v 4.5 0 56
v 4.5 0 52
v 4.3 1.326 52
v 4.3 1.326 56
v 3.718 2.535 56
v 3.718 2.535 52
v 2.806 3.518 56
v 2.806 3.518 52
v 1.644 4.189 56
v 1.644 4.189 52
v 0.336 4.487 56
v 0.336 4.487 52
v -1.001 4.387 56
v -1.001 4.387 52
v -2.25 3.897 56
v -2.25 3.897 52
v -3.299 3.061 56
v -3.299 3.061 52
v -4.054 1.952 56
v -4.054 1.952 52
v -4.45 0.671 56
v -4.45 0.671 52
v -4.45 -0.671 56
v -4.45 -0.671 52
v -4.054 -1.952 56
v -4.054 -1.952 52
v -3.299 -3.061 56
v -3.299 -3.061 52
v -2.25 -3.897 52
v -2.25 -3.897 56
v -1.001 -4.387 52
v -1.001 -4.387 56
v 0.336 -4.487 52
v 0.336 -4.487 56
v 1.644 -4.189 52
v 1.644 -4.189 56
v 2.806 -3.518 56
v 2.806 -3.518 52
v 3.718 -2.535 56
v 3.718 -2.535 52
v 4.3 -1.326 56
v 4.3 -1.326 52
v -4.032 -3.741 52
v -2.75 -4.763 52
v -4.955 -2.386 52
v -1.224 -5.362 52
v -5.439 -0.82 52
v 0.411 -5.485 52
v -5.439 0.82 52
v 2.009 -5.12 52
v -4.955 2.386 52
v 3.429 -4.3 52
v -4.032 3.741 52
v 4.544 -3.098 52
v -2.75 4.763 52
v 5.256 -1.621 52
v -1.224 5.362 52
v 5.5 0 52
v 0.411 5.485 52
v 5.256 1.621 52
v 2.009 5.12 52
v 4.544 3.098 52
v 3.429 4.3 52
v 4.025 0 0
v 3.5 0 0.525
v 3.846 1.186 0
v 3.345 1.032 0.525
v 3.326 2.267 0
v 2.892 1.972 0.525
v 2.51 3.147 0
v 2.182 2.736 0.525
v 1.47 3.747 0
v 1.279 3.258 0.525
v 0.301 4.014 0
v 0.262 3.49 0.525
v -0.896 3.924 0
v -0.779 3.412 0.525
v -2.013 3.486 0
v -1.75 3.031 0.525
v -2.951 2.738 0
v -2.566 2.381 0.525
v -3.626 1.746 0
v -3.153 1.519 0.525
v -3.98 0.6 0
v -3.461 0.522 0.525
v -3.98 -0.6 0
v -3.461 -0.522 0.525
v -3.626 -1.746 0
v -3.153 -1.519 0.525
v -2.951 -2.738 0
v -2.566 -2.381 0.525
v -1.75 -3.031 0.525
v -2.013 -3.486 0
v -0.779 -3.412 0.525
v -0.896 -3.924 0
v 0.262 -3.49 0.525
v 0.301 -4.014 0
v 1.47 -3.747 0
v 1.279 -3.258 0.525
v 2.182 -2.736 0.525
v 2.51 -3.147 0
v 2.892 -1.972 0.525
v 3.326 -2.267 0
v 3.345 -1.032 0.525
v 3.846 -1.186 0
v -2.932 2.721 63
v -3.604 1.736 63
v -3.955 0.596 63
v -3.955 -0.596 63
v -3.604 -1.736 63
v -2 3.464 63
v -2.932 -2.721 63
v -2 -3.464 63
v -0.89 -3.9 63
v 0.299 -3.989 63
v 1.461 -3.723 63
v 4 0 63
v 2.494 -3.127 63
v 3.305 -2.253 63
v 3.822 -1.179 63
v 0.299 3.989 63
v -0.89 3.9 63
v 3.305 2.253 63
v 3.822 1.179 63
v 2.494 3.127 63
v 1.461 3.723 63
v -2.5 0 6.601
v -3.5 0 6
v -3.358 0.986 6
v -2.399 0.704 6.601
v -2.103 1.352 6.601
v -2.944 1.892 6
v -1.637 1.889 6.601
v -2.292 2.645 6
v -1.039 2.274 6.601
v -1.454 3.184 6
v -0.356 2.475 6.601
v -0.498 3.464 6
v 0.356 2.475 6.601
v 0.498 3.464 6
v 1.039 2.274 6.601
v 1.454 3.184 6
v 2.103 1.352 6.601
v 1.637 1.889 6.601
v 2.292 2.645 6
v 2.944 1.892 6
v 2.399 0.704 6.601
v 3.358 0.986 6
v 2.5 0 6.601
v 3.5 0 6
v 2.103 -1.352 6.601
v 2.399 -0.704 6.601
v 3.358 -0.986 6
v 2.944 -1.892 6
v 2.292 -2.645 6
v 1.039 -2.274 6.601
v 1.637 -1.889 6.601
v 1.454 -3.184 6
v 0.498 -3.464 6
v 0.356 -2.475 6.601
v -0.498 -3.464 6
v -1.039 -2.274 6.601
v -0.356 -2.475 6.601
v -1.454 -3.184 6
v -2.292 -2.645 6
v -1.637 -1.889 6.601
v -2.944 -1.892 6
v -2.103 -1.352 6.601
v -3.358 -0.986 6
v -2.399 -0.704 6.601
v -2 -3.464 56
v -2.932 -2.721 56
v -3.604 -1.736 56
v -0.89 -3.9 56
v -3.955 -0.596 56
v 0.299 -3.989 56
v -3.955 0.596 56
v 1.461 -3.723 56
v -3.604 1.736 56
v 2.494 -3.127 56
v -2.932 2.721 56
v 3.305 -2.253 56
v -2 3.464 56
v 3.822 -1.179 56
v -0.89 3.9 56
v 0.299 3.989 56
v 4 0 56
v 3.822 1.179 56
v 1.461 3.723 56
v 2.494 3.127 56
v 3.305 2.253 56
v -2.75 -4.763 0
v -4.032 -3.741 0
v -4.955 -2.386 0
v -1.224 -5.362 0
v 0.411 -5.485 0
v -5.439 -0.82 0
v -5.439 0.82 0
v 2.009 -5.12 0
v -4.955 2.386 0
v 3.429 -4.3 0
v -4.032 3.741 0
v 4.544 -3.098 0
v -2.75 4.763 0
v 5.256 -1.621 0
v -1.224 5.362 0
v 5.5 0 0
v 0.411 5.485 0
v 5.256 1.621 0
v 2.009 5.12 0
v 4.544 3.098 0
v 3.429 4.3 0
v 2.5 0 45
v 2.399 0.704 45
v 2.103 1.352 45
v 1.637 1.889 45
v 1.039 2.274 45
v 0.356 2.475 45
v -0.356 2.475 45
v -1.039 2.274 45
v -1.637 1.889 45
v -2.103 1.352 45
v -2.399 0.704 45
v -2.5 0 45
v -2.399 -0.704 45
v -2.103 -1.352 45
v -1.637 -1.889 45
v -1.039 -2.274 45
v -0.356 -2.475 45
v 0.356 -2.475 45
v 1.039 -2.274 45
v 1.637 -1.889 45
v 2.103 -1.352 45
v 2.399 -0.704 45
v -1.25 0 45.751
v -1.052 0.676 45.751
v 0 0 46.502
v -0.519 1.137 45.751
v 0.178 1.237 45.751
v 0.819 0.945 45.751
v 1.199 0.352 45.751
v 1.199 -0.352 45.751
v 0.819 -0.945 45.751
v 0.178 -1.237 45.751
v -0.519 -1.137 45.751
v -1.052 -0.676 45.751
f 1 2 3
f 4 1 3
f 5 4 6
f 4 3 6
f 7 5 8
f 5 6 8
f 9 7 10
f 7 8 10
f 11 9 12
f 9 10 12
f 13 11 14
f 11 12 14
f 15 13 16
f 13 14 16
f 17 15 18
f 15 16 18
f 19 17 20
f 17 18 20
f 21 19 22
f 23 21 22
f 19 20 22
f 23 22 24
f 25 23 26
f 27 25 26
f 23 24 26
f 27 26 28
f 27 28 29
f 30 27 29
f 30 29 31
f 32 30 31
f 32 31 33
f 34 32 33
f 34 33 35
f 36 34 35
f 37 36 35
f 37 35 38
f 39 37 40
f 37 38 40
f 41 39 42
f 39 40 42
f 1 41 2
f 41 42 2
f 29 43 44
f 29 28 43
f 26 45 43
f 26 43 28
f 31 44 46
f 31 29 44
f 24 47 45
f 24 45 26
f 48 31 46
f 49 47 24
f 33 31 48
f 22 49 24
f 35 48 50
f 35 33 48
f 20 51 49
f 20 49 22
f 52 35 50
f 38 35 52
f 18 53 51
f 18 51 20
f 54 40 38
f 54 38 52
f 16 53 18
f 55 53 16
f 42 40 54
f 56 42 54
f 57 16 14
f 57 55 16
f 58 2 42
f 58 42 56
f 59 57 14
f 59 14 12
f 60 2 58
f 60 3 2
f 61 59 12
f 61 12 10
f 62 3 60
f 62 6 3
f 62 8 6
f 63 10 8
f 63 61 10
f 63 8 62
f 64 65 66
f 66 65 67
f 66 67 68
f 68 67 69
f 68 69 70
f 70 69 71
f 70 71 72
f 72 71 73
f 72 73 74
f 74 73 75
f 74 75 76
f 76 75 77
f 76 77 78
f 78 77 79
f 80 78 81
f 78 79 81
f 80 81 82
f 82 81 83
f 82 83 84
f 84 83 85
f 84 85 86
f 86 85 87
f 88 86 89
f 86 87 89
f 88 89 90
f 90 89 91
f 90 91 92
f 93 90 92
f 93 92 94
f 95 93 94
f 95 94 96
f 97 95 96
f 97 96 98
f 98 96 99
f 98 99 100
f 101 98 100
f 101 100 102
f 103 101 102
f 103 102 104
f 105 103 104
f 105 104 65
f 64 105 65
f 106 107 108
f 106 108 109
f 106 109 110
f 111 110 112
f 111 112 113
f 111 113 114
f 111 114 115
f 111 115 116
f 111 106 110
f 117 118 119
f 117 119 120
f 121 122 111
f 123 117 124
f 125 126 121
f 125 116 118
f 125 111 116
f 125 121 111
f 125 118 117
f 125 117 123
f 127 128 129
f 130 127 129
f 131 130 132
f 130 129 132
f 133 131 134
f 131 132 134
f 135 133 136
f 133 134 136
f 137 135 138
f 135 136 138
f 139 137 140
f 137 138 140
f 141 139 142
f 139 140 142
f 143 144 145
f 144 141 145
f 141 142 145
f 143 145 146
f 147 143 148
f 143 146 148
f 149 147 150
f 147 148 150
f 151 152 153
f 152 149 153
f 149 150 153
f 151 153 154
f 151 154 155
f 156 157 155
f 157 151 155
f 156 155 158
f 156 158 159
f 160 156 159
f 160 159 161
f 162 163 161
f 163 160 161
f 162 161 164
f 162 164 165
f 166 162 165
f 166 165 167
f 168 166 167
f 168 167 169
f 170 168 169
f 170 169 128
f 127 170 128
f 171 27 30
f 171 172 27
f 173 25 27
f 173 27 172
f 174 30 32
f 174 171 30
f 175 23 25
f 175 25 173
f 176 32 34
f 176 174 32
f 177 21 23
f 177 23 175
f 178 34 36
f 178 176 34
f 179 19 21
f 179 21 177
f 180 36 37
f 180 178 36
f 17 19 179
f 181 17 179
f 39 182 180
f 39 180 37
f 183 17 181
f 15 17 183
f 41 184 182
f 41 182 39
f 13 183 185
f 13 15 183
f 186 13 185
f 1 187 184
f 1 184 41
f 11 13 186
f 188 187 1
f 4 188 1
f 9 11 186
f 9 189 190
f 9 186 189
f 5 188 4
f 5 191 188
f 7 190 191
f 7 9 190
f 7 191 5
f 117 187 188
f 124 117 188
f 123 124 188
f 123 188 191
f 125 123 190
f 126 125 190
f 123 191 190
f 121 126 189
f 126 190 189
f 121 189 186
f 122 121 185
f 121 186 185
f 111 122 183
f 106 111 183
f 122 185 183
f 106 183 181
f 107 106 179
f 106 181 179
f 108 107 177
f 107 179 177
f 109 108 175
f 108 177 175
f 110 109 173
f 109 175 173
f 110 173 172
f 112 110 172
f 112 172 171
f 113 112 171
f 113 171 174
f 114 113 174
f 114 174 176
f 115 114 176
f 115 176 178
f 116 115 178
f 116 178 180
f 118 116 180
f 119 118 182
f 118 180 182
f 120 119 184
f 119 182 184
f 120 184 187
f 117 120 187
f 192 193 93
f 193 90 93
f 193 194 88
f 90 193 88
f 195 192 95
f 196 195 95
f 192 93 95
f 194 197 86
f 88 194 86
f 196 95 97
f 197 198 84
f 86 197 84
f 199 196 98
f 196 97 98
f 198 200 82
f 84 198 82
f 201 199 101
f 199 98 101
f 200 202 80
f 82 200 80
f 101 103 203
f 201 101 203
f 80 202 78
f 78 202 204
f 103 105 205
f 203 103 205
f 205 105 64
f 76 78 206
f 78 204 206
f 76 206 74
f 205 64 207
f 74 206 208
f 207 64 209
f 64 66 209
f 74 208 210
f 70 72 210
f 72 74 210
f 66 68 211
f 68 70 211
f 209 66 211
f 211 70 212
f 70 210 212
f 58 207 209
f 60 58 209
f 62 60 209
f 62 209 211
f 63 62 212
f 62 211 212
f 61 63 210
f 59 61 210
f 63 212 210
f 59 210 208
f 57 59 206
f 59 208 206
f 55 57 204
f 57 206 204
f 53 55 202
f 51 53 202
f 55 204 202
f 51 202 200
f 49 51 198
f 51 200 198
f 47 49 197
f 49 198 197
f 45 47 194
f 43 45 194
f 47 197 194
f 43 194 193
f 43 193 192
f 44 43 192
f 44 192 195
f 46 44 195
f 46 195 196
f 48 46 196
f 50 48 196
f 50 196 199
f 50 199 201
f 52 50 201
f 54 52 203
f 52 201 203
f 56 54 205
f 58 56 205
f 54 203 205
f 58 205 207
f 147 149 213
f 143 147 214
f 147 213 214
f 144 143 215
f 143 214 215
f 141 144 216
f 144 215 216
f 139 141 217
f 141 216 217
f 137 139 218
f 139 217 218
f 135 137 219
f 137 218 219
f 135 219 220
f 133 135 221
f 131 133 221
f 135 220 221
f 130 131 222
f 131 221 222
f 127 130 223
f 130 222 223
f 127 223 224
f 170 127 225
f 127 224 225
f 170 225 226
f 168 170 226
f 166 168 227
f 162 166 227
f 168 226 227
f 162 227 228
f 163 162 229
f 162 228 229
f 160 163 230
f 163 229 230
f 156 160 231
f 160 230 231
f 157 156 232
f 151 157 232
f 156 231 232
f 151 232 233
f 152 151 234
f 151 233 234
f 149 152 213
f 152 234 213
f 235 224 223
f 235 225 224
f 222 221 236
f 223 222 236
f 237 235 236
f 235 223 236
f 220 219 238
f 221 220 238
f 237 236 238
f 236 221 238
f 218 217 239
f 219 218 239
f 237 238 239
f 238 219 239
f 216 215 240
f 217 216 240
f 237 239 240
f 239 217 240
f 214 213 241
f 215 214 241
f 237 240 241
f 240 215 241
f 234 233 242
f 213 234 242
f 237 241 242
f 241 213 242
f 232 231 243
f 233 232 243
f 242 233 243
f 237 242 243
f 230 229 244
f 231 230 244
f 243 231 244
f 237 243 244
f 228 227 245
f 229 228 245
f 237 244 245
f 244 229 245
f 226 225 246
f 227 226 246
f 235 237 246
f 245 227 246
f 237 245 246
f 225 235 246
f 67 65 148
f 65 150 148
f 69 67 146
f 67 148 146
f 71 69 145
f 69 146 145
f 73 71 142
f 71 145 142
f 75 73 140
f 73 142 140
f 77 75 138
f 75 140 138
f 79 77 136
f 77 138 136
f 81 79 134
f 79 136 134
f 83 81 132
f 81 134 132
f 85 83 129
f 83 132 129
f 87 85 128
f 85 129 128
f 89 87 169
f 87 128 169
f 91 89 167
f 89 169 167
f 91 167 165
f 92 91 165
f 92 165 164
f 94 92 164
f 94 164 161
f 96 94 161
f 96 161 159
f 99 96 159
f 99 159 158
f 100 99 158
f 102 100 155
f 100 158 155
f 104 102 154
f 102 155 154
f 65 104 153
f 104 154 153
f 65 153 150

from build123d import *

# Parameters (mm, degrees)
SKETCH1_R                       = 5.5
BOSS_EXTRUDE1_DEPTH             = 52
SKETCH2_R                       = 4.5
BOSS_EXTRUDE2_DEPTH             = 4
SKETCH3_R                       = 4
BOSS_EXTRUDE3_DEPTH             = 7
F_5_0_5_DIAMETER_HOLE1_D        = 5
F_5_0_5_DIAMETER_HOLE1_DEPTH    = 45
F_5_0_5_DIAMETER_HOLE1_TIP      = 1.502151548
M8X1_0_TAPPED_HOLE1_D           = 7
M8X1_0_TAPPED_HOLE1_DEPTH       = 6
M8X1_0_TAPPED_HOLE1_CSINK_D     = 8.05
M8X1_0_TAPPED_HOLE1_CSINK_ANGLE = 90
M8X1_0_TAPPED_HOLE1_TIP         = 2.103012167


with BuildPart() as part:
    # Sketch1 → Boss-Extrude1 (new body)
    with BuildSketch(Plane.XY):
        Circle(SKETCH1_R)
    extrude(amount=BOSS_EXTRUDE1_DEPTH)

    # Sketch2 → Boss-Extrude2 (add)
    with BuildSketch(Plane.XY.offset(52)):
        Circle(SKETCH2_R)
    extrude(amount=BOSS_EXTRUDE2_DEPTH)

    # Sketch3 → Boss-Extrude3 (add)
    with BuildSketch(Plane.XY.offset(56)):
        Circle(SKETCH3_R)
    extrude(amount=BOSS_EXTRUDE3_DEPTH)

    # Ø5.0 (5) Diameter Hole1
    with Locations(Plane(origin=(0, 0, 0), x_dir=(-1, 0, 0), z_dir=(0, 0, -1))):
        with Locations((0, 0)):
            Hole(F_5_0_5_DIAMETER_HOLE1_D / 2, depth=F_5_0_5_DIAMETER_HOLE1_DEPTH)
            with Locations((0, 0, -(F_5_0_5_DIAMETER_HOLE1_DEPTH + F_5_0_5_DIAMETER_HOLE1_TIP / 2))):  # 118° drill point
                Cone(0, F_5_0_5_DIAMETER_HOLE1_D / 2, F_5_0_5_DIAMETER_HOLE1_TIP, mode=Mode.SUBTRACT)

    # M8x1.0 Tapped Hole1
    with Locations(Plane(origin=(0, 0, 0), x_dir=(-1, 0, 0), z_dir=(0, 0, -1))):
        with Locations((0, 0)):
            CounterSinkHole(M8X1_0_TAPPED_HOLE1_D / 2, M8X1_0_TAPPED_HOLE1_CSINK_D / 2, depth=M8X1_0_TAPPED_HOLE1_DEPTH, counter_sink_angle=M8X1_0_TAPPED_HOLE1_CSINK_ANGLE)
            with Locations((0, 0, -(M8X1_0_TAPPED_HOLE1_DEPTH + M8X1_0_TAPPED_HOLE1_TIP / 2))):  # 118° drill point
                Cone(0, M8X1_0_TAPPED_HOLE1_D / 2, M8X1_0_TAPPED_HOLE1_TIP, mode=Mode.SUBTRACT)


solid = part.part
